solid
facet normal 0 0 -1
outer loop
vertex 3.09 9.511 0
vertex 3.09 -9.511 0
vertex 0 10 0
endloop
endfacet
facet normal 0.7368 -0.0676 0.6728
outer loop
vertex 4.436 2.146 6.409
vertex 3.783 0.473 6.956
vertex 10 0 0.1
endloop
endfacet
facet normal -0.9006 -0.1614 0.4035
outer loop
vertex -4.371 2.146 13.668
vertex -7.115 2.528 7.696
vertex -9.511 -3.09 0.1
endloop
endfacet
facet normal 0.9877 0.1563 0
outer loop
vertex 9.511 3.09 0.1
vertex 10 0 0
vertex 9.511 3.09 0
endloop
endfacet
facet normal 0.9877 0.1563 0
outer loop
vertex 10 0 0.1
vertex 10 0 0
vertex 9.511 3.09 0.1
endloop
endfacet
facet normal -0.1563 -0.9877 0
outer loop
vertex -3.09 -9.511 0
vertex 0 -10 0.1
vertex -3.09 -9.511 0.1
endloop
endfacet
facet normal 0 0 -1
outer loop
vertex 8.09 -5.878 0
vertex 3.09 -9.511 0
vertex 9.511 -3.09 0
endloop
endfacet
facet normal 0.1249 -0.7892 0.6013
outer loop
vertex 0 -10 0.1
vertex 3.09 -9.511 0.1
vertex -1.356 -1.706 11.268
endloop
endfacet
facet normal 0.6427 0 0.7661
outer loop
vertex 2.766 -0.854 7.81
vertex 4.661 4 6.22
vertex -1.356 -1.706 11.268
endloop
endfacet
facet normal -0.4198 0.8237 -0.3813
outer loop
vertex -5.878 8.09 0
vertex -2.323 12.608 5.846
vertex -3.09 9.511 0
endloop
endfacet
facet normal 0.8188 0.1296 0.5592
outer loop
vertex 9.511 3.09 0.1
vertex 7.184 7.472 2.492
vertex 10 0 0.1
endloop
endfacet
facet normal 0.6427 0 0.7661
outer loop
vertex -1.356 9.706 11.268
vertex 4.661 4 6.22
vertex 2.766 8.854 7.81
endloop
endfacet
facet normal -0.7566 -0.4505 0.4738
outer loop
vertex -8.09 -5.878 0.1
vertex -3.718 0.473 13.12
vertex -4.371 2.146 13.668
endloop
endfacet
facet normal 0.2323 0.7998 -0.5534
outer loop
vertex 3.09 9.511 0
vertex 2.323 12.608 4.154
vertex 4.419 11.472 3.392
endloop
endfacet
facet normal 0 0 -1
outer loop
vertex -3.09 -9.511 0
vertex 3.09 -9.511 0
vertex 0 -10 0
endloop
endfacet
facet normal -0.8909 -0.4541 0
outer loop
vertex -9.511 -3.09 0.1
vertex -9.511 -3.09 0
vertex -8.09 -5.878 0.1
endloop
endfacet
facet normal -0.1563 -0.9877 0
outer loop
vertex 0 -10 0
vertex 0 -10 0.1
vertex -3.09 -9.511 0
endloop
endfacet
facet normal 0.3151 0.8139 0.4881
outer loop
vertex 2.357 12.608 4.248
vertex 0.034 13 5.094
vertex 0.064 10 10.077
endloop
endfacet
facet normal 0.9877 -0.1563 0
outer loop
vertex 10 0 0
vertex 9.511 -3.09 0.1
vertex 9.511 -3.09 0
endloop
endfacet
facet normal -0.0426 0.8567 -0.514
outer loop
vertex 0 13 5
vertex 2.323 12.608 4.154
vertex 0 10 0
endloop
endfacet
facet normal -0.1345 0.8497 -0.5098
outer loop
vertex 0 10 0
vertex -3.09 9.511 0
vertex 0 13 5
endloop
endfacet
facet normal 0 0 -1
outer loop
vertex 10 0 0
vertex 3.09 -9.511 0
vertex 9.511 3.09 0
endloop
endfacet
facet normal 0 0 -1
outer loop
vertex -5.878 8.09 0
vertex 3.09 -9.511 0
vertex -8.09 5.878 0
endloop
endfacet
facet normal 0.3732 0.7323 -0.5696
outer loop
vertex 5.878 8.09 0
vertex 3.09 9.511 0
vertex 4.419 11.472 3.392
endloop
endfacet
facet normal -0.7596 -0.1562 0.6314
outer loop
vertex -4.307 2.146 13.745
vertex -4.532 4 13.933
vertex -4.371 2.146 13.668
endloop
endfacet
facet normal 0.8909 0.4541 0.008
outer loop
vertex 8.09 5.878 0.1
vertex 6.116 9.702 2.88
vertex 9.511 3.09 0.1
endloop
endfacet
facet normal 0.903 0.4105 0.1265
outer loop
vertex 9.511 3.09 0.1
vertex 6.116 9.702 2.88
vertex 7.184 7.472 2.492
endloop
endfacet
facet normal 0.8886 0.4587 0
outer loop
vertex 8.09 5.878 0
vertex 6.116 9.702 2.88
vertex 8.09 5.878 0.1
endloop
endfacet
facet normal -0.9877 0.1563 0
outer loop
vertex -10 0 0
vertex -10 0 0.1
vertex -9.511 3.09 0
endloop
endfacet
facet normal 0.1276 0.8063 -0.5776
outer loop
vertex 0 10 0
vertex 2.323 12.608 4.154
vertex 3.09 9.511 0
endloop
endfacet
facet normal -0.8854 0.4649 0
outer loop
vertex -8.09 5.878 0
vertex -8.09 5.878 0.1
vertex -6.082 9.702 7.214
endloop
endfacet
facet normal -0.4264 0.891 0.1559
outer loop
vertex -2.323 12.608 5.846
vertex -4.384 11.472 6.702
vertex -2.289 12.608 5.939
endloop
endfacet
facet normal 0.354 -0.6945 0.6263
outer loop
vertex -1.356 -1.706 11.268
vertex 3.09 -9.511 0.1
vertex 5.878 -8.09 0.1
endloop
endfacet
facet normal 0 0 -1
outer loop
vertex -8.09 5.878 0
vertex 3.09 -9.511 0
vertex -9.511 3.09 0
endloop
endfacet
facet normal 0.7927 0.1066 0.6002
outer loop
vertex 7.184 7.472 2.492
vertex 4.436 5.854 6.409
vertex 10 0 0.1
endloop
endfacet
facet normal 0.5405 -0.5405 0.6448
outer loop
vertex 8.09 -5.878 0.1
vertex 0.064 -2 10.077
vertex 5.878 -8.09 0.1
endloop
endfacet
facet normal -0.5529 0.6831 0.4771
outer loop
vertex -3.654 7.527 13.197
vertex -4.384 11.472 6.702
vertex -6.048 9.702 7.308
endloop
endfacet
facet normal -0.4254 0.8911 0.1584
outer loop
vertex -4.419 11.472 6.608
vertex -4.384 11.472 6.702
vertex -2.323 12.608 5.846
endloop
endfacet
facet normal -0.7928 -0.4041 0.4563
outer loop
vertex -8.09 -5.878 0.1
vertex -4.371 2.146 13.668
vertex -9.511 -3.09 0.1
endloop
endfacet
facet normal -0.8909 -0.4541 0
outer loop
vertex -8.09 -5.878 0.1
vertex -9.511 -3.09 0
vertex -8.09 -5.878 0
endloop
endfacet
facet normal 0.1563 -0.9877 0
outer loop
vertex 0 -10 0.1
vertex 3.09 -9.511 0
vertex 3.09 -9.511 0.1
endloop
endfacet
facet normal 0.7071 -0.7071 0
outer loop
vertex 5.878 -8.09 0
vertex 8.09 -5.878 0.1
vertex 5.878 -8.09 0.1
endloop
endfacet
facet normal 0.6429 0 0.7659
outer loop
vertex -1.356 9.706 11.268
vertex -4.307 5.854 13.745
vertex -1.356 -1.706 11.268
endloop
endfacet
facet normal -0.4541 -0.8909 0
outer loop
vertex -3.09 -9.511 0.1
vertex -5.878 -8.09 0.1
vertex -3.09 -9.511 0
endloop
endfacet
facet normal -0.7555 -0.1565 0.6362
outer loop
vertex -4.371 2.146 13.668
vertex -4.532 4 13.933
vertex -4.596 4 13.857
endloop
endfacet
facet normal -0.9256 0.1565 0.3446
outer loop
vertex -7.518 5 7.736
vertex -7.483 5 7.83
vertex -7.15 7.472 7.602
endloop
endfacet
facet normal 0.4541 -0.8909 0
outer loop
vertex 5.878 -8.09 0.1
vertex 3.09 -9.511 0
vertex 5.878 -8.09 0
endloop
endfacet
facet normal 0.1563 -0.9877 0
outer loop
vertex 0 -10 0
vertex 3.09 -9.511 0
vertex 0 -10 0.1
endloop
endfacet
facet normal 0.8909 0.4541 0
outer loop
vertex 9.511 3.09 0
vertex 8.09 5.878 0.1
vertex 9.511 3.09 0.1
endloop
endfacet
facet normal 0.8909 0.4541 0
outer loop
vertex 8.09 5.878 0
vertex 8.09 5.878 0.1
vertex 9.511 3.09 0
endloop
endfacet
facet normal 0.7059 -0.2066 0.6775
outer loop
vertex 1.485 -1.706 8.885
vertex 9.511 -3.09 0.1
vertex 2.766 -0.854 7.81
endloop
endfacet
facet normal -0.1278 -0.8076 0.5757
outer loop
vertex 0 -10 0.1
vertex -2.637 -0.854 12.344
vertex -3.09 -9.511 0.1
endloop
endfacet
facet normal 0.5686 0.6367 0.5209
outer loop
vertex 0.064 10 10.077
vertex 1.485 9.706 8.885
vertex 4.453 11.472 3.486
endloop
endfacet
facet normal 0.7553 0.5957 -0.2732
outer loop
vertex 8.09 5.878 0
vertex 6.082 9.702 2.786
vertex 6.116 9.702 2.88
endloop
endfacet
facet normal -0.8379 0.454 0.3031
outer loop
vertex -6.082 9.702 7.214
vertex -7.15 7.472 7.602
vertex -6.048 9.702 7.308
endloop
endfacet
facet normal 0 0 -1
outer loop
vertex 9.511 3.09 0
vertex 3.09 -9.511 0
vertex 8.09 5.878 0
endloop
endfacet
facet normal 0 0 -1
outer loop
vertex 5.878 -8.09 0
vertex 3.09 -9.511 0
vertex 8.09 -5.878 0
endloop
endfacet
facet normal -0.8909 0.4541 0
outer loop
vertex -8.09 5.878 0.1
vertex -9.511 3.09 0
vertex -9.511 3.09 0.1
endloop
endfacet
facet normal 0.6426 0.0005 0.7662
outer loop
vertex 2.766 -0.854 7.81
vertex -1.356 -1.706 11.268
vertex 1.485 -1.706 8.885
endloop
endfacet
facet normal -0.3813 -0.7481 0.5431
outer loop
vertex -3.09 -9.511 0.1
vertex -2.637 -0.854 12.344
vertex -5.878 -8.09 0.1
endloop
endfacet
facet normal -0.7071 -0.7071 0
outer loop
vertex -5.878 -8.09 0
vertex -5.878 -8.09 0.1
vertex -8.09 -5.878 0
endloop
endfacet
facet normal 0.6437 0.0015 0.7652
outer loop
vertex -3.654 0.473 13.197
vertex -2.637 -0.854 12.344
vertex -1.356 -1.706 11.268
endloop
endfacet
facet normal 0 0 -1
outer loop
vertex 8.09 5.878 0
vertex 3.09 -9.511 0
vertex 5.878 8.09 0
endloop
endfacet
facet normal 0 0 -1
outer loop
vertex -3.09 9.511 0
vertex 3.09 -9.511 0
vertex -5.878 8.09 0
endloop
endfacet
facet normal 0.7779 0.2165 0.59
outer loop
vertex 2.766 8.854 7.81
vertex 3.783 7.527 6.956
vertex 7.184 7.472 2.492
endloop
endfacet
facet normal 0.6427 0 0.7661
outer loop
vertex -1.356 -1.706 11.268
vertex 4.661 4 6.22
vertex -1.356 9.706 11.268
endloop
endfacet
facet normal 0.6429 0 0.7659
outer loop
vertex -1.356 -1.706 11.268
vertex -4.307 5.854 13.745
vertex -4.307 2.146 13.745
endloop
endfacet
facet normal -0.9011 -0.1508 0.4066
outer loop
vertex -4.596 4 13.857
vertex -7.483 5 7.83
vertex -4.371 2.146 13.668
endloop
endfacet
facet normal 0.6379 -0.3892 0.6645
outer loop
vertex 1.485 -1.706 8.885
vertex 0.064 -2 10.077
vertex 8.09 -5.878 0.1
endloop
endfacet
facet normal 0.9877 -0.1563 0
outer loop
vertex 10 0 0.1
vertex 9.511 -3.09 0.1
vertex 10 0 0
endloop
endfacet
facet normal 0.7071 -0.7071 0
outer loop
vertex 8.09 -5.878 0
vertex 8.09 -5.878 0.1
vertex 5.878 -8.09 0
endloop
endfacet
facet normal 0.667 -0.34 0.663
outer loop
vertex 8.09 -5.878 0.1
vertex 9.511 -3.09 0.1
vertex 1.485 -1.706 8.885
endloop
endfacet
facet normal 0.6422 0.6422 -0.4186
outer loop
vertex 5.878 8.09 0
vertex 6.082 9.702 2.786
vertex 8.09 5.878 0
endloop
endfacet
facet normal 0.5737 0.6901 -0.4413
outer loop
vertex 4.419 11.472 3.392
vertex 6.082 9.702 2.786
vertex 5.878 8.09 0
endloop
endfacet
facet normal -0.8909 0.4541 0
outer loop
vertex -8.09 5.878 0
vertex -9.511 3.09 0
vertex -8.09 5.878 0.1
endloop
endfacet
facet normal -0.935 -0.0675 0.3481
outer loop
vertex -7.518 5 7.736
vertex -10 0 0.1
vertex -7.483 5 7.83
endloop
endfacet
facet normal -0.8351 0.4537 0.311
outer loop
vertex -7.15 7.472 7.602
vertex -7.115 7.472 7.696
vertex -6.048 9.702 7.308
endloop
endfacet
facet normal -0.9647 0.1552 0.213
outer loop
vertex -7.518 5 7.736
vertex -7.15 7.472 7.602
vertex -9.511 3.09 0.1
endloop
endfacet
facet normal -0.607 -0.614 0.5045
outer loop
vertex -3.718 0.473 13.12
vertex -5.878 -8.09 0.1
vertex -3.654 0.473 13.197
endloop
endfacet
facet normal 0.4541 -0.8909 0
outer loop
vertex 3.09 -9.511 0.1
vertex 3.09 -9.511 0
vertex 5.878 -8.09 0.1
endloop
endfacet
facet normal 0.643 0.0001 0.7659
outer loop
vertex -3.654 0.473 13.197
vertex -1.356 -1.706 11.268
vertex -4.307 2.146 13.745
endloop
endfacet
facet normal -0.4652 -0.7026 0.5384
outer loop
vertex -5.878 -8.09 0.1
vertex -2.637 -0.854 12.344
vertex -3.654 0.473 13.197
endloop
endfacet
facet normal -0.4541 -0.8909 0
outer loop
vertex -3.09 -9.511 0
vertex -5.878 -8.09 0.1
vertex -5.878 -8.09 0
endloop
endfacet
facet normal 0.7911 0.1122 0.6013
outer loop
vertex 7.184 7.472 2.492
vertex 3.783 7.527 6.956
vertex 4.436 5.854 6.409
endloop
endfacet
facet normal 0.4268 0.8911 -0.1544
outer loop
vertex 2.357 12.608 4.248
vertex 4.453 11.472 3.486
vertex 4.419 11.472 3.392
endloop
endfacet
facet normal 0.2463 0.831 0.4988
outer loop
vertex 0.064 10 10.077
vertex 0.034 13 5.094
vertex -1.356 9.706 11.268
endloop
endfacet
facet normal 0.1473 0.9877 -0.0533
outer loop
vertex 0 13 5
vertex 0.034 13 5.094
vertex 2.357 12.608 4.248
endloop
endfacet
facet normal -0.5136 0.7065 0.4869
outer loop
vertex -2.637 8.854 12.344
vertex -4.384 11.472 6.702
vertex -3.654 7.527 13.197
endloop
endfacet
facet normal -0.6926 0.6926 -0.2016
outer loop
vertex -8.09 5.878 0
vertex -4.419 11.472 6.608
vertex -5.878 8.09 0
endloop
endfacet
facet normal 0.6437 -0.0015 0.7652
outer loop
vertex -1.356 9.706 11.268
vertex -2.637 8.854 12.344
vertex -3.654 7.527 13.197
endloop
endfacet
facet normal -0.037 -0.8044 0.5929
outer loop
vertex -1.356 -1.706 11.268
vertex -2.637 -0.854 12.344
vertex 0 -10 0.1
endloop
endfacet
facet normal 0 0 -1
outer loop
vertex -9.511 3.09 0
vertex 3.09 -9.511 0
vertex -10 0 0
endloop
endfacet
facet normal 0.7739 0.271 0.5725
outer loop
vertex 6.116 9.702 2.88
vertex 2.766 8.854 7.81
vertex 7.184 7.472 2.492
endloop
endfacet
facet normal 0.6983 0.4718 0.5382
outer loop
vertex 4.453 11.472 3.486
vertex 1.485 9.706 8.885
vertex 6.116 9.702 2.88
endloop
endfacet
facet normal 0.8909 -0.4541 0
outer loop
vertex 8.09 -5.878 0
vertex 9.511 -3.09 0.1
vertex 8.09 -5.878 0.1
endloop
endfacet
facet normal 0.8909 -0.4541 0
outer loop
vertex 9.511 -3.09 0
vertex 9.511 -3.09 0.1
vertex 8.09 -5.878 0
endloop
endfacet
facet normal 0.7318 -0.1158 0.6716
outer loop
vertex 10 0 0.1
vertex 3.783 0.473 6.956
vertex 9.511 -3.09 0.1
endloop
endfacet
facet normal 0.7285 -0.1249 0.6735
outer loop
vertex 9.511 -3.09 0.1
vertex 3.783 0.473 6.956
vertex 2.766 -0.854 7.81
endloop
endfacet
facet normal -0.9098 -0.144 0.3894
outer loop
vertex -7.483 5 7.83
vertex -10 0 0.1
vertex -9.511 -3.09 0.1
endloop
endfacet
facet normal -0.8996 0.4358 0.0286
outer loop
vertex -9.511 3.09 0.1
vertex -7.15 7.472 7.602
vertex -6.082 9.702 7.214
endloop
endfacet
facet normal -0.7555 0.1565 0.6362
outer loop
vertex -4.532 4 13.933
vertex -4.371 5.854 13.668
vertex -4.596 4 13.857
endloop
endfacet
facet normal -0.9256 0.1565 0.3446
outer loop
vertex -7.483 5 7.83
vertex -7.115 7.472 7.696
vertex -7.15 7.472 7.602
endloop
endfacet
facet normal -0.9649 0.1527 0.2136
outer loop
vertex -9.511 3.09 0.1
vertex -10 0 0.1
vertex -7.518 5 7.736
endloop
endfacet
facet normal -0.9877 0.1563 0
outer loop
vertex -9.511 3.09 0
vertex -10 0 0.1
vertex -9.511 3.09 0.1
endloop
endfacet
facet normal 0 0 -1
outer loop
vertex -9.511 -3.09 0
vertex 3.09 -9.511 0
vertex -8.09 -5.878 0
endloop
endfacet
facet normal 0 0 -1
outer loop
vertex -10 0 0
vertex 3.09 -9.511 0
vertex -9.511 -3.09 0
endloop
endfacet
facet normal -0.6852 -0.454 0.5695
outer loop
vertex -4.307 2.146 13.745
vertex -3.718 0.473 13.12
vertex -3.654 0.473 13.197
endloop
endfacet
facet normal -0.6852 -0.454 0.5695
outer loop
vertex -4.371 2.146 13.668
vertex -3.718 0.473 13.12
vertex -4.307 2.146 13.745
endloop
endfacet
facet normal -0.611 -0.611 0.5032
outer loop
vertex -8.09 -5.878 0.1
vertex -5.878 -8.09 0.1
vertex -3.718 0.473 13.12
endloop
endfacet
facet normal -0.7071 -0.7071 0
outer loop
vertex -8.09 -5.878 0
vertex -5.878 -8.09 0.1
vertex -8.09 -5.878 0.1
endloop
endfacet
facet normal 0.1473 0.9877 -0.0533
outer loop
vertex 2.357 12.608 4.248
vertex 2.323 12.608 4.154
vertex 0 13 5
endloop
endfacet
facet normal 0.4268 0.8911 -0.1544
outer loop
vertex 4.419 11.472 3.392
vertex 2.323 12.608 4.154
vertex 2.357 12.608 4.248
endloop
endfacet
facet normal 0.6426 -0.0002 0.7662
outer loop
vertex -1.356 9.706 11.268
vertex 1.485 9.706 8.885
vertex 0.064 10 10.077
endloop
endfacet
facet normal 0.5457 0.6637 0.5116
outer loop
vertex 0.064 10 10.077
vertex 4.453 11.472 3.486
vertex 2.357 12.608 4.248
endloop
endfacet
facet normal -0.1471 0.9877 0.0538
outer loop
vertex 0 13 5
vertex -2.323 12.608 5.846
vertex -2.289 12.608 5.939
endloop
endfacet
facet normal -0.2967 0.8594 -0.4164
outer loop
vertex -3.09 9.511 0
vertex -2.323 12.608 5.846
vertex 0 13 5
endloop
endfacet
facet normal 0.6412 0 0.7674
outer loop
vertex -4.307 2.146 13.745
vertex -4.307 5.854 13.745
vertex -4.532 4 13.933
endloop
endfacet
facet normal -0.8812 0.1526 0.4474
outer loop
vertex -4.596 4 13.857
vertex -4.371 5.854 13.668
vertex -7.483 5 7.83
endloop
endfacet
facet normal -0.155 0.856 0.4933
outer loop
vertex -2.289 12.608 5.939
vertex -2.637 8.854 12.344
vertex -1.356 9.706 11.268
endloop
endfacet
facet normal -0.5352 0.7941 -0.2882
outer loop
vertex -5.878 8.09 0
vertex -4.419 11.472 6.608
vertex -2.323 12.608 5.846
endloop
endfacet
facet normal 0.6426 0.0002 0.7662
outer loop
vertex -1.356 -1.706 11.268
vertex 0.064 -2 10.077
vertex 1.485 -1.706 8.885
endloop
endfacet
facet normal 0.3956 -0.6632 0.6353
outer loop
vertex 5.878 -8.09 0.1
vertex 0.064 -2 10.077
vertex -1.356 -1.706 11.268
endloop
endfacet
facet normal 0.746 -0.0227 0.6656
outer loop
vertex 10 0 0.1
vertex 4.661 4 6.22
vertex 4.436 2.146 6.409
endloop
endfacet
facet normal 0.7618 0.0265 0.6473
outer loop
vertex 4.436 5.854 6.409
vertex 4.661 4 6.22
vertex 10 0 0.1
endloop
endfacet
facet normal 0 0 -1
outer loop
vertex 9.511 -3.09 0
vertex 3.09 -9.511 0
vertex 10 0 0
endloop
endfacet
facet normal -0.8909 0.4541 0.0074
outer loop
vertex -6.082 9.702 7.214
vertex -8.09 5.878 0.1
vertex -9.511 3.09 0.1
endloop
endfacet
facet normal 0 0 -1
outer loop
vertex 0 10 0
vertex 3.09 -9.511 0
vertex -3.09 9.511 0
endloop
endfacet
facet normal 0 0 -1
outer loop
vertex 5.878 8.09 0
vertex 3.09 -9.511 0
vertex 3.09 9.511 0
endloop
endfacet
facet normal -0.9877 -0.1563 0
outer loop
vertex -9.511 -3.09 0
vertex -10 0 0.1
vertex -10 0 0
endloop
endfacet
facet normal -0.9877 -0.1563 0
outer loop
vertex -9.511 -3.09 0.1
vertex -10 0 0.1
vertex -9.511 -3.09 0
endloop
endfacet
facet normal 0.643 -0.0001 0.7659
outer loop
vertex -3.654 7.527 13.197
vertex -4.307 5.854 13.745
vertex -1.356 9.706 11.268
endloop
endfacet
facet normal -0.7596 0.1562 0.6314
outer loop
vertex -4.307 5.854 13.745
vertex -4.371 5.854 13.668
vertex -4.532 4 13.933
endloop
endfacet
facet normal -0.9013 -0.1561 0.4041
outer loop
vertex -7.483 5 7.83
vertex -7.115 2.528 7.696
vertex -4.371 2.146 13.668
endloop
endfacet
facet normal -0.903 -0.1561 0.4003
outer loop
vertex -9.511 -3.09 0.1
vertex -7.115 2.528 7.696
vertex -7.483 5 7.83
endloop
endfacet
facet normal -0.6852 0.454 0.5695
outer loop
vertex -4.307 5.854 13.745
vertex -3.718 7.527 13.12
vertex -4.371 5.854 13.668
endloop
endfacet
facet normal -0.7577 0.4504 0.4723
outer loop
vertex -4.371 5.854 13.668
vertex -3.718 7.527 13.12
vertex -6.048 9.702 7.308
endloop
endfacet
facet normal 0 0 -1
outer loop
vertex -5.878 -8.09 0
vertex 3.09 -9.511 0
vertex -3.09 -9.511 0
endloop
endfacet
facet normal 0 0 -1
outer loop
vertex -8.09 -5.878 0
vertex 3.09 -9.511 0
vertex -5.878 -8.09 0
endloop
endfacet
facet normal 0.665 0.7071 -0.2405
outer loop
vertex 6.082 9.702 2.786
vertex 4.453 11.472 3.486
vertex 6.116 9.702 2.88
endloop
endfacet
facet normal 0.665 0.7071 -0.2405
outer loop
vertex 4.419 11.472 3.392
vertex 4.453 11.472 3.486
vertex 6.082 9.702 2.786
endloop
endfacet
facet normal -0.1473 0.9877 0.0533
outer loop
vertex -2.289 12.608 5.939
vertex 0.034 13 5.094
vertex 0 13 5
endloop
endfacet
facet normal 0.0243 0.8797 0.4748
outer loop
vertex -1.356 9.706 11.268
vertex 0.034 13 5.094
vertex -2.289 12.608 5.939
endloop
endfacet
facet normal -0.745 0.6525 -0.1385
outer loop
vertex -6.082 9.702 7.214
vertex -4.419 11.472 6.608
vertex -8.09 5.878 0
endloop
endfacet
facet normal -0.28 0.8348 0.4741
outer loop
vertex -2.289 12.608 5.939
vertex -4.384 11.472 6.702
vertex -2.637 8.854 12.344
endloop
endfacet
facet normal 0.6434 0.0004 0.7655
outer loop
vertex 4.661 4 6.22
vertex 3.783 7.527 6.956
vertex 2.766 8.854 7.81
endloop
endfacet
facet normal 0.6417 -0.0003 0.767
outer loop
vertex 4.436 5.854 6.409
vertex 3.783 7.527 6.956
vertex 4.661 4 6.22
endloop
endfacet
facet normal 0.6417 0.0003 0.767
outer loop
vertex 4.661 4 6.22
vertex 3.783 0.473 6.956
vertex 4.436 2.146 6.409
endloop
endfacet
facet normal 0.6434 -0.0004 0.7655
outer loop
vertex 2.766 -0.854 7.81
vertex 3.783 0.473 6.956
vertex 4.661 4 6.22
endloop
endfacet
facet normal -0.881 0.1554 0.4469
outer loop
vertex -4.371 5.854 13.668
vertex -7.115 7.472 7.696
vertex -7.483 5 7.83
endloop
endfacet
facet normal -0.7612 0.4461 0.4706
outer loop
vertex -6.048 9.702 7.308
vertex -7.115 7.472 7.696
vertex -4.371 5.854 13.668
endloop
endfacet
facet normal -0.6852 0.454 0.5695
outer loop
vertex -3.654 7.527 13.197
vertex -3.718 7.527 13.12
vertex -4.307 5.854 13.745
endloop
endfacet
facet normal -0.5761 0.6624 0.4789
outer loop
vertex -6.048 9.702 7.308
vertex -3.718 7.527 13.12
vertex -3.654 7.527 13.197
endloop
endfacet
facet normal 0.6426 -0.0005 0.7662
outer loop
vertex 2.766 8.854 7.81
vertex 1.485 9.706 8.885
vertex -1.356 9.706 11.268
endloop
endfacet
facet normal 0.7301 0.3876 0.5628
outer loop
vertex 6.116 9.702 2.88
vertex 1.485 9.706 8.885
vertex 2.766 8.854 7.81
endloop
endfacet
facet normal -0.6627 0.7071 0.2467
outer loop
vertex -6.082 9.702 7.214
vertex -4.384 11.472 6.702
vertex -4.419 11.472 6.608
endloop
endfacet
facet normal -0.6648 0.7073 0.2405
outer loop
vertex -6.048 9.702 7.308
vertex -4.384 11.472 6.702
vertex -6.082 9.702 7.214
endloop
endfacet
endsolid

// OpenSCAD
//linear_extrude(height = 3, center = false, convexity = 5, twist = 530, $fn = 20)
//translate([1, 1, 0])
//circle(r = 1);

// rotate_extrude(convexity = 10)
// translate([2, 0, 0])
// circle(r = 1, $fn = 100);

// function drop(t) = 100 * 0.5 * (1 - cos(180 * t)) * sin(180 * t) + 1;
// function path(t) = [0, 0, 80 + 80 * cos(180 * t)];
// function rotate(t) = PI * pow((1 - t), 3);

// loft(path="path", scale_x = "drop", scale_y="drop", rotate="rotate", slices=100) circle(r = 1, $fn = 12);
hull(){
	translate([0, 0, 0]) rotate([0, 0, 0]) cylinder(h=0.1, r=10, center=false, $fn=20);
	translate([0, 5, 5]) rotate([0, 20, 0]) cylinder(h=0.1, r=8, center=false, $fn=20);
	translate([0, 4, 10]) rotate([0, 40, 0]) cylinder(h=0.1, r=6, center=false, $fn=20);
}
